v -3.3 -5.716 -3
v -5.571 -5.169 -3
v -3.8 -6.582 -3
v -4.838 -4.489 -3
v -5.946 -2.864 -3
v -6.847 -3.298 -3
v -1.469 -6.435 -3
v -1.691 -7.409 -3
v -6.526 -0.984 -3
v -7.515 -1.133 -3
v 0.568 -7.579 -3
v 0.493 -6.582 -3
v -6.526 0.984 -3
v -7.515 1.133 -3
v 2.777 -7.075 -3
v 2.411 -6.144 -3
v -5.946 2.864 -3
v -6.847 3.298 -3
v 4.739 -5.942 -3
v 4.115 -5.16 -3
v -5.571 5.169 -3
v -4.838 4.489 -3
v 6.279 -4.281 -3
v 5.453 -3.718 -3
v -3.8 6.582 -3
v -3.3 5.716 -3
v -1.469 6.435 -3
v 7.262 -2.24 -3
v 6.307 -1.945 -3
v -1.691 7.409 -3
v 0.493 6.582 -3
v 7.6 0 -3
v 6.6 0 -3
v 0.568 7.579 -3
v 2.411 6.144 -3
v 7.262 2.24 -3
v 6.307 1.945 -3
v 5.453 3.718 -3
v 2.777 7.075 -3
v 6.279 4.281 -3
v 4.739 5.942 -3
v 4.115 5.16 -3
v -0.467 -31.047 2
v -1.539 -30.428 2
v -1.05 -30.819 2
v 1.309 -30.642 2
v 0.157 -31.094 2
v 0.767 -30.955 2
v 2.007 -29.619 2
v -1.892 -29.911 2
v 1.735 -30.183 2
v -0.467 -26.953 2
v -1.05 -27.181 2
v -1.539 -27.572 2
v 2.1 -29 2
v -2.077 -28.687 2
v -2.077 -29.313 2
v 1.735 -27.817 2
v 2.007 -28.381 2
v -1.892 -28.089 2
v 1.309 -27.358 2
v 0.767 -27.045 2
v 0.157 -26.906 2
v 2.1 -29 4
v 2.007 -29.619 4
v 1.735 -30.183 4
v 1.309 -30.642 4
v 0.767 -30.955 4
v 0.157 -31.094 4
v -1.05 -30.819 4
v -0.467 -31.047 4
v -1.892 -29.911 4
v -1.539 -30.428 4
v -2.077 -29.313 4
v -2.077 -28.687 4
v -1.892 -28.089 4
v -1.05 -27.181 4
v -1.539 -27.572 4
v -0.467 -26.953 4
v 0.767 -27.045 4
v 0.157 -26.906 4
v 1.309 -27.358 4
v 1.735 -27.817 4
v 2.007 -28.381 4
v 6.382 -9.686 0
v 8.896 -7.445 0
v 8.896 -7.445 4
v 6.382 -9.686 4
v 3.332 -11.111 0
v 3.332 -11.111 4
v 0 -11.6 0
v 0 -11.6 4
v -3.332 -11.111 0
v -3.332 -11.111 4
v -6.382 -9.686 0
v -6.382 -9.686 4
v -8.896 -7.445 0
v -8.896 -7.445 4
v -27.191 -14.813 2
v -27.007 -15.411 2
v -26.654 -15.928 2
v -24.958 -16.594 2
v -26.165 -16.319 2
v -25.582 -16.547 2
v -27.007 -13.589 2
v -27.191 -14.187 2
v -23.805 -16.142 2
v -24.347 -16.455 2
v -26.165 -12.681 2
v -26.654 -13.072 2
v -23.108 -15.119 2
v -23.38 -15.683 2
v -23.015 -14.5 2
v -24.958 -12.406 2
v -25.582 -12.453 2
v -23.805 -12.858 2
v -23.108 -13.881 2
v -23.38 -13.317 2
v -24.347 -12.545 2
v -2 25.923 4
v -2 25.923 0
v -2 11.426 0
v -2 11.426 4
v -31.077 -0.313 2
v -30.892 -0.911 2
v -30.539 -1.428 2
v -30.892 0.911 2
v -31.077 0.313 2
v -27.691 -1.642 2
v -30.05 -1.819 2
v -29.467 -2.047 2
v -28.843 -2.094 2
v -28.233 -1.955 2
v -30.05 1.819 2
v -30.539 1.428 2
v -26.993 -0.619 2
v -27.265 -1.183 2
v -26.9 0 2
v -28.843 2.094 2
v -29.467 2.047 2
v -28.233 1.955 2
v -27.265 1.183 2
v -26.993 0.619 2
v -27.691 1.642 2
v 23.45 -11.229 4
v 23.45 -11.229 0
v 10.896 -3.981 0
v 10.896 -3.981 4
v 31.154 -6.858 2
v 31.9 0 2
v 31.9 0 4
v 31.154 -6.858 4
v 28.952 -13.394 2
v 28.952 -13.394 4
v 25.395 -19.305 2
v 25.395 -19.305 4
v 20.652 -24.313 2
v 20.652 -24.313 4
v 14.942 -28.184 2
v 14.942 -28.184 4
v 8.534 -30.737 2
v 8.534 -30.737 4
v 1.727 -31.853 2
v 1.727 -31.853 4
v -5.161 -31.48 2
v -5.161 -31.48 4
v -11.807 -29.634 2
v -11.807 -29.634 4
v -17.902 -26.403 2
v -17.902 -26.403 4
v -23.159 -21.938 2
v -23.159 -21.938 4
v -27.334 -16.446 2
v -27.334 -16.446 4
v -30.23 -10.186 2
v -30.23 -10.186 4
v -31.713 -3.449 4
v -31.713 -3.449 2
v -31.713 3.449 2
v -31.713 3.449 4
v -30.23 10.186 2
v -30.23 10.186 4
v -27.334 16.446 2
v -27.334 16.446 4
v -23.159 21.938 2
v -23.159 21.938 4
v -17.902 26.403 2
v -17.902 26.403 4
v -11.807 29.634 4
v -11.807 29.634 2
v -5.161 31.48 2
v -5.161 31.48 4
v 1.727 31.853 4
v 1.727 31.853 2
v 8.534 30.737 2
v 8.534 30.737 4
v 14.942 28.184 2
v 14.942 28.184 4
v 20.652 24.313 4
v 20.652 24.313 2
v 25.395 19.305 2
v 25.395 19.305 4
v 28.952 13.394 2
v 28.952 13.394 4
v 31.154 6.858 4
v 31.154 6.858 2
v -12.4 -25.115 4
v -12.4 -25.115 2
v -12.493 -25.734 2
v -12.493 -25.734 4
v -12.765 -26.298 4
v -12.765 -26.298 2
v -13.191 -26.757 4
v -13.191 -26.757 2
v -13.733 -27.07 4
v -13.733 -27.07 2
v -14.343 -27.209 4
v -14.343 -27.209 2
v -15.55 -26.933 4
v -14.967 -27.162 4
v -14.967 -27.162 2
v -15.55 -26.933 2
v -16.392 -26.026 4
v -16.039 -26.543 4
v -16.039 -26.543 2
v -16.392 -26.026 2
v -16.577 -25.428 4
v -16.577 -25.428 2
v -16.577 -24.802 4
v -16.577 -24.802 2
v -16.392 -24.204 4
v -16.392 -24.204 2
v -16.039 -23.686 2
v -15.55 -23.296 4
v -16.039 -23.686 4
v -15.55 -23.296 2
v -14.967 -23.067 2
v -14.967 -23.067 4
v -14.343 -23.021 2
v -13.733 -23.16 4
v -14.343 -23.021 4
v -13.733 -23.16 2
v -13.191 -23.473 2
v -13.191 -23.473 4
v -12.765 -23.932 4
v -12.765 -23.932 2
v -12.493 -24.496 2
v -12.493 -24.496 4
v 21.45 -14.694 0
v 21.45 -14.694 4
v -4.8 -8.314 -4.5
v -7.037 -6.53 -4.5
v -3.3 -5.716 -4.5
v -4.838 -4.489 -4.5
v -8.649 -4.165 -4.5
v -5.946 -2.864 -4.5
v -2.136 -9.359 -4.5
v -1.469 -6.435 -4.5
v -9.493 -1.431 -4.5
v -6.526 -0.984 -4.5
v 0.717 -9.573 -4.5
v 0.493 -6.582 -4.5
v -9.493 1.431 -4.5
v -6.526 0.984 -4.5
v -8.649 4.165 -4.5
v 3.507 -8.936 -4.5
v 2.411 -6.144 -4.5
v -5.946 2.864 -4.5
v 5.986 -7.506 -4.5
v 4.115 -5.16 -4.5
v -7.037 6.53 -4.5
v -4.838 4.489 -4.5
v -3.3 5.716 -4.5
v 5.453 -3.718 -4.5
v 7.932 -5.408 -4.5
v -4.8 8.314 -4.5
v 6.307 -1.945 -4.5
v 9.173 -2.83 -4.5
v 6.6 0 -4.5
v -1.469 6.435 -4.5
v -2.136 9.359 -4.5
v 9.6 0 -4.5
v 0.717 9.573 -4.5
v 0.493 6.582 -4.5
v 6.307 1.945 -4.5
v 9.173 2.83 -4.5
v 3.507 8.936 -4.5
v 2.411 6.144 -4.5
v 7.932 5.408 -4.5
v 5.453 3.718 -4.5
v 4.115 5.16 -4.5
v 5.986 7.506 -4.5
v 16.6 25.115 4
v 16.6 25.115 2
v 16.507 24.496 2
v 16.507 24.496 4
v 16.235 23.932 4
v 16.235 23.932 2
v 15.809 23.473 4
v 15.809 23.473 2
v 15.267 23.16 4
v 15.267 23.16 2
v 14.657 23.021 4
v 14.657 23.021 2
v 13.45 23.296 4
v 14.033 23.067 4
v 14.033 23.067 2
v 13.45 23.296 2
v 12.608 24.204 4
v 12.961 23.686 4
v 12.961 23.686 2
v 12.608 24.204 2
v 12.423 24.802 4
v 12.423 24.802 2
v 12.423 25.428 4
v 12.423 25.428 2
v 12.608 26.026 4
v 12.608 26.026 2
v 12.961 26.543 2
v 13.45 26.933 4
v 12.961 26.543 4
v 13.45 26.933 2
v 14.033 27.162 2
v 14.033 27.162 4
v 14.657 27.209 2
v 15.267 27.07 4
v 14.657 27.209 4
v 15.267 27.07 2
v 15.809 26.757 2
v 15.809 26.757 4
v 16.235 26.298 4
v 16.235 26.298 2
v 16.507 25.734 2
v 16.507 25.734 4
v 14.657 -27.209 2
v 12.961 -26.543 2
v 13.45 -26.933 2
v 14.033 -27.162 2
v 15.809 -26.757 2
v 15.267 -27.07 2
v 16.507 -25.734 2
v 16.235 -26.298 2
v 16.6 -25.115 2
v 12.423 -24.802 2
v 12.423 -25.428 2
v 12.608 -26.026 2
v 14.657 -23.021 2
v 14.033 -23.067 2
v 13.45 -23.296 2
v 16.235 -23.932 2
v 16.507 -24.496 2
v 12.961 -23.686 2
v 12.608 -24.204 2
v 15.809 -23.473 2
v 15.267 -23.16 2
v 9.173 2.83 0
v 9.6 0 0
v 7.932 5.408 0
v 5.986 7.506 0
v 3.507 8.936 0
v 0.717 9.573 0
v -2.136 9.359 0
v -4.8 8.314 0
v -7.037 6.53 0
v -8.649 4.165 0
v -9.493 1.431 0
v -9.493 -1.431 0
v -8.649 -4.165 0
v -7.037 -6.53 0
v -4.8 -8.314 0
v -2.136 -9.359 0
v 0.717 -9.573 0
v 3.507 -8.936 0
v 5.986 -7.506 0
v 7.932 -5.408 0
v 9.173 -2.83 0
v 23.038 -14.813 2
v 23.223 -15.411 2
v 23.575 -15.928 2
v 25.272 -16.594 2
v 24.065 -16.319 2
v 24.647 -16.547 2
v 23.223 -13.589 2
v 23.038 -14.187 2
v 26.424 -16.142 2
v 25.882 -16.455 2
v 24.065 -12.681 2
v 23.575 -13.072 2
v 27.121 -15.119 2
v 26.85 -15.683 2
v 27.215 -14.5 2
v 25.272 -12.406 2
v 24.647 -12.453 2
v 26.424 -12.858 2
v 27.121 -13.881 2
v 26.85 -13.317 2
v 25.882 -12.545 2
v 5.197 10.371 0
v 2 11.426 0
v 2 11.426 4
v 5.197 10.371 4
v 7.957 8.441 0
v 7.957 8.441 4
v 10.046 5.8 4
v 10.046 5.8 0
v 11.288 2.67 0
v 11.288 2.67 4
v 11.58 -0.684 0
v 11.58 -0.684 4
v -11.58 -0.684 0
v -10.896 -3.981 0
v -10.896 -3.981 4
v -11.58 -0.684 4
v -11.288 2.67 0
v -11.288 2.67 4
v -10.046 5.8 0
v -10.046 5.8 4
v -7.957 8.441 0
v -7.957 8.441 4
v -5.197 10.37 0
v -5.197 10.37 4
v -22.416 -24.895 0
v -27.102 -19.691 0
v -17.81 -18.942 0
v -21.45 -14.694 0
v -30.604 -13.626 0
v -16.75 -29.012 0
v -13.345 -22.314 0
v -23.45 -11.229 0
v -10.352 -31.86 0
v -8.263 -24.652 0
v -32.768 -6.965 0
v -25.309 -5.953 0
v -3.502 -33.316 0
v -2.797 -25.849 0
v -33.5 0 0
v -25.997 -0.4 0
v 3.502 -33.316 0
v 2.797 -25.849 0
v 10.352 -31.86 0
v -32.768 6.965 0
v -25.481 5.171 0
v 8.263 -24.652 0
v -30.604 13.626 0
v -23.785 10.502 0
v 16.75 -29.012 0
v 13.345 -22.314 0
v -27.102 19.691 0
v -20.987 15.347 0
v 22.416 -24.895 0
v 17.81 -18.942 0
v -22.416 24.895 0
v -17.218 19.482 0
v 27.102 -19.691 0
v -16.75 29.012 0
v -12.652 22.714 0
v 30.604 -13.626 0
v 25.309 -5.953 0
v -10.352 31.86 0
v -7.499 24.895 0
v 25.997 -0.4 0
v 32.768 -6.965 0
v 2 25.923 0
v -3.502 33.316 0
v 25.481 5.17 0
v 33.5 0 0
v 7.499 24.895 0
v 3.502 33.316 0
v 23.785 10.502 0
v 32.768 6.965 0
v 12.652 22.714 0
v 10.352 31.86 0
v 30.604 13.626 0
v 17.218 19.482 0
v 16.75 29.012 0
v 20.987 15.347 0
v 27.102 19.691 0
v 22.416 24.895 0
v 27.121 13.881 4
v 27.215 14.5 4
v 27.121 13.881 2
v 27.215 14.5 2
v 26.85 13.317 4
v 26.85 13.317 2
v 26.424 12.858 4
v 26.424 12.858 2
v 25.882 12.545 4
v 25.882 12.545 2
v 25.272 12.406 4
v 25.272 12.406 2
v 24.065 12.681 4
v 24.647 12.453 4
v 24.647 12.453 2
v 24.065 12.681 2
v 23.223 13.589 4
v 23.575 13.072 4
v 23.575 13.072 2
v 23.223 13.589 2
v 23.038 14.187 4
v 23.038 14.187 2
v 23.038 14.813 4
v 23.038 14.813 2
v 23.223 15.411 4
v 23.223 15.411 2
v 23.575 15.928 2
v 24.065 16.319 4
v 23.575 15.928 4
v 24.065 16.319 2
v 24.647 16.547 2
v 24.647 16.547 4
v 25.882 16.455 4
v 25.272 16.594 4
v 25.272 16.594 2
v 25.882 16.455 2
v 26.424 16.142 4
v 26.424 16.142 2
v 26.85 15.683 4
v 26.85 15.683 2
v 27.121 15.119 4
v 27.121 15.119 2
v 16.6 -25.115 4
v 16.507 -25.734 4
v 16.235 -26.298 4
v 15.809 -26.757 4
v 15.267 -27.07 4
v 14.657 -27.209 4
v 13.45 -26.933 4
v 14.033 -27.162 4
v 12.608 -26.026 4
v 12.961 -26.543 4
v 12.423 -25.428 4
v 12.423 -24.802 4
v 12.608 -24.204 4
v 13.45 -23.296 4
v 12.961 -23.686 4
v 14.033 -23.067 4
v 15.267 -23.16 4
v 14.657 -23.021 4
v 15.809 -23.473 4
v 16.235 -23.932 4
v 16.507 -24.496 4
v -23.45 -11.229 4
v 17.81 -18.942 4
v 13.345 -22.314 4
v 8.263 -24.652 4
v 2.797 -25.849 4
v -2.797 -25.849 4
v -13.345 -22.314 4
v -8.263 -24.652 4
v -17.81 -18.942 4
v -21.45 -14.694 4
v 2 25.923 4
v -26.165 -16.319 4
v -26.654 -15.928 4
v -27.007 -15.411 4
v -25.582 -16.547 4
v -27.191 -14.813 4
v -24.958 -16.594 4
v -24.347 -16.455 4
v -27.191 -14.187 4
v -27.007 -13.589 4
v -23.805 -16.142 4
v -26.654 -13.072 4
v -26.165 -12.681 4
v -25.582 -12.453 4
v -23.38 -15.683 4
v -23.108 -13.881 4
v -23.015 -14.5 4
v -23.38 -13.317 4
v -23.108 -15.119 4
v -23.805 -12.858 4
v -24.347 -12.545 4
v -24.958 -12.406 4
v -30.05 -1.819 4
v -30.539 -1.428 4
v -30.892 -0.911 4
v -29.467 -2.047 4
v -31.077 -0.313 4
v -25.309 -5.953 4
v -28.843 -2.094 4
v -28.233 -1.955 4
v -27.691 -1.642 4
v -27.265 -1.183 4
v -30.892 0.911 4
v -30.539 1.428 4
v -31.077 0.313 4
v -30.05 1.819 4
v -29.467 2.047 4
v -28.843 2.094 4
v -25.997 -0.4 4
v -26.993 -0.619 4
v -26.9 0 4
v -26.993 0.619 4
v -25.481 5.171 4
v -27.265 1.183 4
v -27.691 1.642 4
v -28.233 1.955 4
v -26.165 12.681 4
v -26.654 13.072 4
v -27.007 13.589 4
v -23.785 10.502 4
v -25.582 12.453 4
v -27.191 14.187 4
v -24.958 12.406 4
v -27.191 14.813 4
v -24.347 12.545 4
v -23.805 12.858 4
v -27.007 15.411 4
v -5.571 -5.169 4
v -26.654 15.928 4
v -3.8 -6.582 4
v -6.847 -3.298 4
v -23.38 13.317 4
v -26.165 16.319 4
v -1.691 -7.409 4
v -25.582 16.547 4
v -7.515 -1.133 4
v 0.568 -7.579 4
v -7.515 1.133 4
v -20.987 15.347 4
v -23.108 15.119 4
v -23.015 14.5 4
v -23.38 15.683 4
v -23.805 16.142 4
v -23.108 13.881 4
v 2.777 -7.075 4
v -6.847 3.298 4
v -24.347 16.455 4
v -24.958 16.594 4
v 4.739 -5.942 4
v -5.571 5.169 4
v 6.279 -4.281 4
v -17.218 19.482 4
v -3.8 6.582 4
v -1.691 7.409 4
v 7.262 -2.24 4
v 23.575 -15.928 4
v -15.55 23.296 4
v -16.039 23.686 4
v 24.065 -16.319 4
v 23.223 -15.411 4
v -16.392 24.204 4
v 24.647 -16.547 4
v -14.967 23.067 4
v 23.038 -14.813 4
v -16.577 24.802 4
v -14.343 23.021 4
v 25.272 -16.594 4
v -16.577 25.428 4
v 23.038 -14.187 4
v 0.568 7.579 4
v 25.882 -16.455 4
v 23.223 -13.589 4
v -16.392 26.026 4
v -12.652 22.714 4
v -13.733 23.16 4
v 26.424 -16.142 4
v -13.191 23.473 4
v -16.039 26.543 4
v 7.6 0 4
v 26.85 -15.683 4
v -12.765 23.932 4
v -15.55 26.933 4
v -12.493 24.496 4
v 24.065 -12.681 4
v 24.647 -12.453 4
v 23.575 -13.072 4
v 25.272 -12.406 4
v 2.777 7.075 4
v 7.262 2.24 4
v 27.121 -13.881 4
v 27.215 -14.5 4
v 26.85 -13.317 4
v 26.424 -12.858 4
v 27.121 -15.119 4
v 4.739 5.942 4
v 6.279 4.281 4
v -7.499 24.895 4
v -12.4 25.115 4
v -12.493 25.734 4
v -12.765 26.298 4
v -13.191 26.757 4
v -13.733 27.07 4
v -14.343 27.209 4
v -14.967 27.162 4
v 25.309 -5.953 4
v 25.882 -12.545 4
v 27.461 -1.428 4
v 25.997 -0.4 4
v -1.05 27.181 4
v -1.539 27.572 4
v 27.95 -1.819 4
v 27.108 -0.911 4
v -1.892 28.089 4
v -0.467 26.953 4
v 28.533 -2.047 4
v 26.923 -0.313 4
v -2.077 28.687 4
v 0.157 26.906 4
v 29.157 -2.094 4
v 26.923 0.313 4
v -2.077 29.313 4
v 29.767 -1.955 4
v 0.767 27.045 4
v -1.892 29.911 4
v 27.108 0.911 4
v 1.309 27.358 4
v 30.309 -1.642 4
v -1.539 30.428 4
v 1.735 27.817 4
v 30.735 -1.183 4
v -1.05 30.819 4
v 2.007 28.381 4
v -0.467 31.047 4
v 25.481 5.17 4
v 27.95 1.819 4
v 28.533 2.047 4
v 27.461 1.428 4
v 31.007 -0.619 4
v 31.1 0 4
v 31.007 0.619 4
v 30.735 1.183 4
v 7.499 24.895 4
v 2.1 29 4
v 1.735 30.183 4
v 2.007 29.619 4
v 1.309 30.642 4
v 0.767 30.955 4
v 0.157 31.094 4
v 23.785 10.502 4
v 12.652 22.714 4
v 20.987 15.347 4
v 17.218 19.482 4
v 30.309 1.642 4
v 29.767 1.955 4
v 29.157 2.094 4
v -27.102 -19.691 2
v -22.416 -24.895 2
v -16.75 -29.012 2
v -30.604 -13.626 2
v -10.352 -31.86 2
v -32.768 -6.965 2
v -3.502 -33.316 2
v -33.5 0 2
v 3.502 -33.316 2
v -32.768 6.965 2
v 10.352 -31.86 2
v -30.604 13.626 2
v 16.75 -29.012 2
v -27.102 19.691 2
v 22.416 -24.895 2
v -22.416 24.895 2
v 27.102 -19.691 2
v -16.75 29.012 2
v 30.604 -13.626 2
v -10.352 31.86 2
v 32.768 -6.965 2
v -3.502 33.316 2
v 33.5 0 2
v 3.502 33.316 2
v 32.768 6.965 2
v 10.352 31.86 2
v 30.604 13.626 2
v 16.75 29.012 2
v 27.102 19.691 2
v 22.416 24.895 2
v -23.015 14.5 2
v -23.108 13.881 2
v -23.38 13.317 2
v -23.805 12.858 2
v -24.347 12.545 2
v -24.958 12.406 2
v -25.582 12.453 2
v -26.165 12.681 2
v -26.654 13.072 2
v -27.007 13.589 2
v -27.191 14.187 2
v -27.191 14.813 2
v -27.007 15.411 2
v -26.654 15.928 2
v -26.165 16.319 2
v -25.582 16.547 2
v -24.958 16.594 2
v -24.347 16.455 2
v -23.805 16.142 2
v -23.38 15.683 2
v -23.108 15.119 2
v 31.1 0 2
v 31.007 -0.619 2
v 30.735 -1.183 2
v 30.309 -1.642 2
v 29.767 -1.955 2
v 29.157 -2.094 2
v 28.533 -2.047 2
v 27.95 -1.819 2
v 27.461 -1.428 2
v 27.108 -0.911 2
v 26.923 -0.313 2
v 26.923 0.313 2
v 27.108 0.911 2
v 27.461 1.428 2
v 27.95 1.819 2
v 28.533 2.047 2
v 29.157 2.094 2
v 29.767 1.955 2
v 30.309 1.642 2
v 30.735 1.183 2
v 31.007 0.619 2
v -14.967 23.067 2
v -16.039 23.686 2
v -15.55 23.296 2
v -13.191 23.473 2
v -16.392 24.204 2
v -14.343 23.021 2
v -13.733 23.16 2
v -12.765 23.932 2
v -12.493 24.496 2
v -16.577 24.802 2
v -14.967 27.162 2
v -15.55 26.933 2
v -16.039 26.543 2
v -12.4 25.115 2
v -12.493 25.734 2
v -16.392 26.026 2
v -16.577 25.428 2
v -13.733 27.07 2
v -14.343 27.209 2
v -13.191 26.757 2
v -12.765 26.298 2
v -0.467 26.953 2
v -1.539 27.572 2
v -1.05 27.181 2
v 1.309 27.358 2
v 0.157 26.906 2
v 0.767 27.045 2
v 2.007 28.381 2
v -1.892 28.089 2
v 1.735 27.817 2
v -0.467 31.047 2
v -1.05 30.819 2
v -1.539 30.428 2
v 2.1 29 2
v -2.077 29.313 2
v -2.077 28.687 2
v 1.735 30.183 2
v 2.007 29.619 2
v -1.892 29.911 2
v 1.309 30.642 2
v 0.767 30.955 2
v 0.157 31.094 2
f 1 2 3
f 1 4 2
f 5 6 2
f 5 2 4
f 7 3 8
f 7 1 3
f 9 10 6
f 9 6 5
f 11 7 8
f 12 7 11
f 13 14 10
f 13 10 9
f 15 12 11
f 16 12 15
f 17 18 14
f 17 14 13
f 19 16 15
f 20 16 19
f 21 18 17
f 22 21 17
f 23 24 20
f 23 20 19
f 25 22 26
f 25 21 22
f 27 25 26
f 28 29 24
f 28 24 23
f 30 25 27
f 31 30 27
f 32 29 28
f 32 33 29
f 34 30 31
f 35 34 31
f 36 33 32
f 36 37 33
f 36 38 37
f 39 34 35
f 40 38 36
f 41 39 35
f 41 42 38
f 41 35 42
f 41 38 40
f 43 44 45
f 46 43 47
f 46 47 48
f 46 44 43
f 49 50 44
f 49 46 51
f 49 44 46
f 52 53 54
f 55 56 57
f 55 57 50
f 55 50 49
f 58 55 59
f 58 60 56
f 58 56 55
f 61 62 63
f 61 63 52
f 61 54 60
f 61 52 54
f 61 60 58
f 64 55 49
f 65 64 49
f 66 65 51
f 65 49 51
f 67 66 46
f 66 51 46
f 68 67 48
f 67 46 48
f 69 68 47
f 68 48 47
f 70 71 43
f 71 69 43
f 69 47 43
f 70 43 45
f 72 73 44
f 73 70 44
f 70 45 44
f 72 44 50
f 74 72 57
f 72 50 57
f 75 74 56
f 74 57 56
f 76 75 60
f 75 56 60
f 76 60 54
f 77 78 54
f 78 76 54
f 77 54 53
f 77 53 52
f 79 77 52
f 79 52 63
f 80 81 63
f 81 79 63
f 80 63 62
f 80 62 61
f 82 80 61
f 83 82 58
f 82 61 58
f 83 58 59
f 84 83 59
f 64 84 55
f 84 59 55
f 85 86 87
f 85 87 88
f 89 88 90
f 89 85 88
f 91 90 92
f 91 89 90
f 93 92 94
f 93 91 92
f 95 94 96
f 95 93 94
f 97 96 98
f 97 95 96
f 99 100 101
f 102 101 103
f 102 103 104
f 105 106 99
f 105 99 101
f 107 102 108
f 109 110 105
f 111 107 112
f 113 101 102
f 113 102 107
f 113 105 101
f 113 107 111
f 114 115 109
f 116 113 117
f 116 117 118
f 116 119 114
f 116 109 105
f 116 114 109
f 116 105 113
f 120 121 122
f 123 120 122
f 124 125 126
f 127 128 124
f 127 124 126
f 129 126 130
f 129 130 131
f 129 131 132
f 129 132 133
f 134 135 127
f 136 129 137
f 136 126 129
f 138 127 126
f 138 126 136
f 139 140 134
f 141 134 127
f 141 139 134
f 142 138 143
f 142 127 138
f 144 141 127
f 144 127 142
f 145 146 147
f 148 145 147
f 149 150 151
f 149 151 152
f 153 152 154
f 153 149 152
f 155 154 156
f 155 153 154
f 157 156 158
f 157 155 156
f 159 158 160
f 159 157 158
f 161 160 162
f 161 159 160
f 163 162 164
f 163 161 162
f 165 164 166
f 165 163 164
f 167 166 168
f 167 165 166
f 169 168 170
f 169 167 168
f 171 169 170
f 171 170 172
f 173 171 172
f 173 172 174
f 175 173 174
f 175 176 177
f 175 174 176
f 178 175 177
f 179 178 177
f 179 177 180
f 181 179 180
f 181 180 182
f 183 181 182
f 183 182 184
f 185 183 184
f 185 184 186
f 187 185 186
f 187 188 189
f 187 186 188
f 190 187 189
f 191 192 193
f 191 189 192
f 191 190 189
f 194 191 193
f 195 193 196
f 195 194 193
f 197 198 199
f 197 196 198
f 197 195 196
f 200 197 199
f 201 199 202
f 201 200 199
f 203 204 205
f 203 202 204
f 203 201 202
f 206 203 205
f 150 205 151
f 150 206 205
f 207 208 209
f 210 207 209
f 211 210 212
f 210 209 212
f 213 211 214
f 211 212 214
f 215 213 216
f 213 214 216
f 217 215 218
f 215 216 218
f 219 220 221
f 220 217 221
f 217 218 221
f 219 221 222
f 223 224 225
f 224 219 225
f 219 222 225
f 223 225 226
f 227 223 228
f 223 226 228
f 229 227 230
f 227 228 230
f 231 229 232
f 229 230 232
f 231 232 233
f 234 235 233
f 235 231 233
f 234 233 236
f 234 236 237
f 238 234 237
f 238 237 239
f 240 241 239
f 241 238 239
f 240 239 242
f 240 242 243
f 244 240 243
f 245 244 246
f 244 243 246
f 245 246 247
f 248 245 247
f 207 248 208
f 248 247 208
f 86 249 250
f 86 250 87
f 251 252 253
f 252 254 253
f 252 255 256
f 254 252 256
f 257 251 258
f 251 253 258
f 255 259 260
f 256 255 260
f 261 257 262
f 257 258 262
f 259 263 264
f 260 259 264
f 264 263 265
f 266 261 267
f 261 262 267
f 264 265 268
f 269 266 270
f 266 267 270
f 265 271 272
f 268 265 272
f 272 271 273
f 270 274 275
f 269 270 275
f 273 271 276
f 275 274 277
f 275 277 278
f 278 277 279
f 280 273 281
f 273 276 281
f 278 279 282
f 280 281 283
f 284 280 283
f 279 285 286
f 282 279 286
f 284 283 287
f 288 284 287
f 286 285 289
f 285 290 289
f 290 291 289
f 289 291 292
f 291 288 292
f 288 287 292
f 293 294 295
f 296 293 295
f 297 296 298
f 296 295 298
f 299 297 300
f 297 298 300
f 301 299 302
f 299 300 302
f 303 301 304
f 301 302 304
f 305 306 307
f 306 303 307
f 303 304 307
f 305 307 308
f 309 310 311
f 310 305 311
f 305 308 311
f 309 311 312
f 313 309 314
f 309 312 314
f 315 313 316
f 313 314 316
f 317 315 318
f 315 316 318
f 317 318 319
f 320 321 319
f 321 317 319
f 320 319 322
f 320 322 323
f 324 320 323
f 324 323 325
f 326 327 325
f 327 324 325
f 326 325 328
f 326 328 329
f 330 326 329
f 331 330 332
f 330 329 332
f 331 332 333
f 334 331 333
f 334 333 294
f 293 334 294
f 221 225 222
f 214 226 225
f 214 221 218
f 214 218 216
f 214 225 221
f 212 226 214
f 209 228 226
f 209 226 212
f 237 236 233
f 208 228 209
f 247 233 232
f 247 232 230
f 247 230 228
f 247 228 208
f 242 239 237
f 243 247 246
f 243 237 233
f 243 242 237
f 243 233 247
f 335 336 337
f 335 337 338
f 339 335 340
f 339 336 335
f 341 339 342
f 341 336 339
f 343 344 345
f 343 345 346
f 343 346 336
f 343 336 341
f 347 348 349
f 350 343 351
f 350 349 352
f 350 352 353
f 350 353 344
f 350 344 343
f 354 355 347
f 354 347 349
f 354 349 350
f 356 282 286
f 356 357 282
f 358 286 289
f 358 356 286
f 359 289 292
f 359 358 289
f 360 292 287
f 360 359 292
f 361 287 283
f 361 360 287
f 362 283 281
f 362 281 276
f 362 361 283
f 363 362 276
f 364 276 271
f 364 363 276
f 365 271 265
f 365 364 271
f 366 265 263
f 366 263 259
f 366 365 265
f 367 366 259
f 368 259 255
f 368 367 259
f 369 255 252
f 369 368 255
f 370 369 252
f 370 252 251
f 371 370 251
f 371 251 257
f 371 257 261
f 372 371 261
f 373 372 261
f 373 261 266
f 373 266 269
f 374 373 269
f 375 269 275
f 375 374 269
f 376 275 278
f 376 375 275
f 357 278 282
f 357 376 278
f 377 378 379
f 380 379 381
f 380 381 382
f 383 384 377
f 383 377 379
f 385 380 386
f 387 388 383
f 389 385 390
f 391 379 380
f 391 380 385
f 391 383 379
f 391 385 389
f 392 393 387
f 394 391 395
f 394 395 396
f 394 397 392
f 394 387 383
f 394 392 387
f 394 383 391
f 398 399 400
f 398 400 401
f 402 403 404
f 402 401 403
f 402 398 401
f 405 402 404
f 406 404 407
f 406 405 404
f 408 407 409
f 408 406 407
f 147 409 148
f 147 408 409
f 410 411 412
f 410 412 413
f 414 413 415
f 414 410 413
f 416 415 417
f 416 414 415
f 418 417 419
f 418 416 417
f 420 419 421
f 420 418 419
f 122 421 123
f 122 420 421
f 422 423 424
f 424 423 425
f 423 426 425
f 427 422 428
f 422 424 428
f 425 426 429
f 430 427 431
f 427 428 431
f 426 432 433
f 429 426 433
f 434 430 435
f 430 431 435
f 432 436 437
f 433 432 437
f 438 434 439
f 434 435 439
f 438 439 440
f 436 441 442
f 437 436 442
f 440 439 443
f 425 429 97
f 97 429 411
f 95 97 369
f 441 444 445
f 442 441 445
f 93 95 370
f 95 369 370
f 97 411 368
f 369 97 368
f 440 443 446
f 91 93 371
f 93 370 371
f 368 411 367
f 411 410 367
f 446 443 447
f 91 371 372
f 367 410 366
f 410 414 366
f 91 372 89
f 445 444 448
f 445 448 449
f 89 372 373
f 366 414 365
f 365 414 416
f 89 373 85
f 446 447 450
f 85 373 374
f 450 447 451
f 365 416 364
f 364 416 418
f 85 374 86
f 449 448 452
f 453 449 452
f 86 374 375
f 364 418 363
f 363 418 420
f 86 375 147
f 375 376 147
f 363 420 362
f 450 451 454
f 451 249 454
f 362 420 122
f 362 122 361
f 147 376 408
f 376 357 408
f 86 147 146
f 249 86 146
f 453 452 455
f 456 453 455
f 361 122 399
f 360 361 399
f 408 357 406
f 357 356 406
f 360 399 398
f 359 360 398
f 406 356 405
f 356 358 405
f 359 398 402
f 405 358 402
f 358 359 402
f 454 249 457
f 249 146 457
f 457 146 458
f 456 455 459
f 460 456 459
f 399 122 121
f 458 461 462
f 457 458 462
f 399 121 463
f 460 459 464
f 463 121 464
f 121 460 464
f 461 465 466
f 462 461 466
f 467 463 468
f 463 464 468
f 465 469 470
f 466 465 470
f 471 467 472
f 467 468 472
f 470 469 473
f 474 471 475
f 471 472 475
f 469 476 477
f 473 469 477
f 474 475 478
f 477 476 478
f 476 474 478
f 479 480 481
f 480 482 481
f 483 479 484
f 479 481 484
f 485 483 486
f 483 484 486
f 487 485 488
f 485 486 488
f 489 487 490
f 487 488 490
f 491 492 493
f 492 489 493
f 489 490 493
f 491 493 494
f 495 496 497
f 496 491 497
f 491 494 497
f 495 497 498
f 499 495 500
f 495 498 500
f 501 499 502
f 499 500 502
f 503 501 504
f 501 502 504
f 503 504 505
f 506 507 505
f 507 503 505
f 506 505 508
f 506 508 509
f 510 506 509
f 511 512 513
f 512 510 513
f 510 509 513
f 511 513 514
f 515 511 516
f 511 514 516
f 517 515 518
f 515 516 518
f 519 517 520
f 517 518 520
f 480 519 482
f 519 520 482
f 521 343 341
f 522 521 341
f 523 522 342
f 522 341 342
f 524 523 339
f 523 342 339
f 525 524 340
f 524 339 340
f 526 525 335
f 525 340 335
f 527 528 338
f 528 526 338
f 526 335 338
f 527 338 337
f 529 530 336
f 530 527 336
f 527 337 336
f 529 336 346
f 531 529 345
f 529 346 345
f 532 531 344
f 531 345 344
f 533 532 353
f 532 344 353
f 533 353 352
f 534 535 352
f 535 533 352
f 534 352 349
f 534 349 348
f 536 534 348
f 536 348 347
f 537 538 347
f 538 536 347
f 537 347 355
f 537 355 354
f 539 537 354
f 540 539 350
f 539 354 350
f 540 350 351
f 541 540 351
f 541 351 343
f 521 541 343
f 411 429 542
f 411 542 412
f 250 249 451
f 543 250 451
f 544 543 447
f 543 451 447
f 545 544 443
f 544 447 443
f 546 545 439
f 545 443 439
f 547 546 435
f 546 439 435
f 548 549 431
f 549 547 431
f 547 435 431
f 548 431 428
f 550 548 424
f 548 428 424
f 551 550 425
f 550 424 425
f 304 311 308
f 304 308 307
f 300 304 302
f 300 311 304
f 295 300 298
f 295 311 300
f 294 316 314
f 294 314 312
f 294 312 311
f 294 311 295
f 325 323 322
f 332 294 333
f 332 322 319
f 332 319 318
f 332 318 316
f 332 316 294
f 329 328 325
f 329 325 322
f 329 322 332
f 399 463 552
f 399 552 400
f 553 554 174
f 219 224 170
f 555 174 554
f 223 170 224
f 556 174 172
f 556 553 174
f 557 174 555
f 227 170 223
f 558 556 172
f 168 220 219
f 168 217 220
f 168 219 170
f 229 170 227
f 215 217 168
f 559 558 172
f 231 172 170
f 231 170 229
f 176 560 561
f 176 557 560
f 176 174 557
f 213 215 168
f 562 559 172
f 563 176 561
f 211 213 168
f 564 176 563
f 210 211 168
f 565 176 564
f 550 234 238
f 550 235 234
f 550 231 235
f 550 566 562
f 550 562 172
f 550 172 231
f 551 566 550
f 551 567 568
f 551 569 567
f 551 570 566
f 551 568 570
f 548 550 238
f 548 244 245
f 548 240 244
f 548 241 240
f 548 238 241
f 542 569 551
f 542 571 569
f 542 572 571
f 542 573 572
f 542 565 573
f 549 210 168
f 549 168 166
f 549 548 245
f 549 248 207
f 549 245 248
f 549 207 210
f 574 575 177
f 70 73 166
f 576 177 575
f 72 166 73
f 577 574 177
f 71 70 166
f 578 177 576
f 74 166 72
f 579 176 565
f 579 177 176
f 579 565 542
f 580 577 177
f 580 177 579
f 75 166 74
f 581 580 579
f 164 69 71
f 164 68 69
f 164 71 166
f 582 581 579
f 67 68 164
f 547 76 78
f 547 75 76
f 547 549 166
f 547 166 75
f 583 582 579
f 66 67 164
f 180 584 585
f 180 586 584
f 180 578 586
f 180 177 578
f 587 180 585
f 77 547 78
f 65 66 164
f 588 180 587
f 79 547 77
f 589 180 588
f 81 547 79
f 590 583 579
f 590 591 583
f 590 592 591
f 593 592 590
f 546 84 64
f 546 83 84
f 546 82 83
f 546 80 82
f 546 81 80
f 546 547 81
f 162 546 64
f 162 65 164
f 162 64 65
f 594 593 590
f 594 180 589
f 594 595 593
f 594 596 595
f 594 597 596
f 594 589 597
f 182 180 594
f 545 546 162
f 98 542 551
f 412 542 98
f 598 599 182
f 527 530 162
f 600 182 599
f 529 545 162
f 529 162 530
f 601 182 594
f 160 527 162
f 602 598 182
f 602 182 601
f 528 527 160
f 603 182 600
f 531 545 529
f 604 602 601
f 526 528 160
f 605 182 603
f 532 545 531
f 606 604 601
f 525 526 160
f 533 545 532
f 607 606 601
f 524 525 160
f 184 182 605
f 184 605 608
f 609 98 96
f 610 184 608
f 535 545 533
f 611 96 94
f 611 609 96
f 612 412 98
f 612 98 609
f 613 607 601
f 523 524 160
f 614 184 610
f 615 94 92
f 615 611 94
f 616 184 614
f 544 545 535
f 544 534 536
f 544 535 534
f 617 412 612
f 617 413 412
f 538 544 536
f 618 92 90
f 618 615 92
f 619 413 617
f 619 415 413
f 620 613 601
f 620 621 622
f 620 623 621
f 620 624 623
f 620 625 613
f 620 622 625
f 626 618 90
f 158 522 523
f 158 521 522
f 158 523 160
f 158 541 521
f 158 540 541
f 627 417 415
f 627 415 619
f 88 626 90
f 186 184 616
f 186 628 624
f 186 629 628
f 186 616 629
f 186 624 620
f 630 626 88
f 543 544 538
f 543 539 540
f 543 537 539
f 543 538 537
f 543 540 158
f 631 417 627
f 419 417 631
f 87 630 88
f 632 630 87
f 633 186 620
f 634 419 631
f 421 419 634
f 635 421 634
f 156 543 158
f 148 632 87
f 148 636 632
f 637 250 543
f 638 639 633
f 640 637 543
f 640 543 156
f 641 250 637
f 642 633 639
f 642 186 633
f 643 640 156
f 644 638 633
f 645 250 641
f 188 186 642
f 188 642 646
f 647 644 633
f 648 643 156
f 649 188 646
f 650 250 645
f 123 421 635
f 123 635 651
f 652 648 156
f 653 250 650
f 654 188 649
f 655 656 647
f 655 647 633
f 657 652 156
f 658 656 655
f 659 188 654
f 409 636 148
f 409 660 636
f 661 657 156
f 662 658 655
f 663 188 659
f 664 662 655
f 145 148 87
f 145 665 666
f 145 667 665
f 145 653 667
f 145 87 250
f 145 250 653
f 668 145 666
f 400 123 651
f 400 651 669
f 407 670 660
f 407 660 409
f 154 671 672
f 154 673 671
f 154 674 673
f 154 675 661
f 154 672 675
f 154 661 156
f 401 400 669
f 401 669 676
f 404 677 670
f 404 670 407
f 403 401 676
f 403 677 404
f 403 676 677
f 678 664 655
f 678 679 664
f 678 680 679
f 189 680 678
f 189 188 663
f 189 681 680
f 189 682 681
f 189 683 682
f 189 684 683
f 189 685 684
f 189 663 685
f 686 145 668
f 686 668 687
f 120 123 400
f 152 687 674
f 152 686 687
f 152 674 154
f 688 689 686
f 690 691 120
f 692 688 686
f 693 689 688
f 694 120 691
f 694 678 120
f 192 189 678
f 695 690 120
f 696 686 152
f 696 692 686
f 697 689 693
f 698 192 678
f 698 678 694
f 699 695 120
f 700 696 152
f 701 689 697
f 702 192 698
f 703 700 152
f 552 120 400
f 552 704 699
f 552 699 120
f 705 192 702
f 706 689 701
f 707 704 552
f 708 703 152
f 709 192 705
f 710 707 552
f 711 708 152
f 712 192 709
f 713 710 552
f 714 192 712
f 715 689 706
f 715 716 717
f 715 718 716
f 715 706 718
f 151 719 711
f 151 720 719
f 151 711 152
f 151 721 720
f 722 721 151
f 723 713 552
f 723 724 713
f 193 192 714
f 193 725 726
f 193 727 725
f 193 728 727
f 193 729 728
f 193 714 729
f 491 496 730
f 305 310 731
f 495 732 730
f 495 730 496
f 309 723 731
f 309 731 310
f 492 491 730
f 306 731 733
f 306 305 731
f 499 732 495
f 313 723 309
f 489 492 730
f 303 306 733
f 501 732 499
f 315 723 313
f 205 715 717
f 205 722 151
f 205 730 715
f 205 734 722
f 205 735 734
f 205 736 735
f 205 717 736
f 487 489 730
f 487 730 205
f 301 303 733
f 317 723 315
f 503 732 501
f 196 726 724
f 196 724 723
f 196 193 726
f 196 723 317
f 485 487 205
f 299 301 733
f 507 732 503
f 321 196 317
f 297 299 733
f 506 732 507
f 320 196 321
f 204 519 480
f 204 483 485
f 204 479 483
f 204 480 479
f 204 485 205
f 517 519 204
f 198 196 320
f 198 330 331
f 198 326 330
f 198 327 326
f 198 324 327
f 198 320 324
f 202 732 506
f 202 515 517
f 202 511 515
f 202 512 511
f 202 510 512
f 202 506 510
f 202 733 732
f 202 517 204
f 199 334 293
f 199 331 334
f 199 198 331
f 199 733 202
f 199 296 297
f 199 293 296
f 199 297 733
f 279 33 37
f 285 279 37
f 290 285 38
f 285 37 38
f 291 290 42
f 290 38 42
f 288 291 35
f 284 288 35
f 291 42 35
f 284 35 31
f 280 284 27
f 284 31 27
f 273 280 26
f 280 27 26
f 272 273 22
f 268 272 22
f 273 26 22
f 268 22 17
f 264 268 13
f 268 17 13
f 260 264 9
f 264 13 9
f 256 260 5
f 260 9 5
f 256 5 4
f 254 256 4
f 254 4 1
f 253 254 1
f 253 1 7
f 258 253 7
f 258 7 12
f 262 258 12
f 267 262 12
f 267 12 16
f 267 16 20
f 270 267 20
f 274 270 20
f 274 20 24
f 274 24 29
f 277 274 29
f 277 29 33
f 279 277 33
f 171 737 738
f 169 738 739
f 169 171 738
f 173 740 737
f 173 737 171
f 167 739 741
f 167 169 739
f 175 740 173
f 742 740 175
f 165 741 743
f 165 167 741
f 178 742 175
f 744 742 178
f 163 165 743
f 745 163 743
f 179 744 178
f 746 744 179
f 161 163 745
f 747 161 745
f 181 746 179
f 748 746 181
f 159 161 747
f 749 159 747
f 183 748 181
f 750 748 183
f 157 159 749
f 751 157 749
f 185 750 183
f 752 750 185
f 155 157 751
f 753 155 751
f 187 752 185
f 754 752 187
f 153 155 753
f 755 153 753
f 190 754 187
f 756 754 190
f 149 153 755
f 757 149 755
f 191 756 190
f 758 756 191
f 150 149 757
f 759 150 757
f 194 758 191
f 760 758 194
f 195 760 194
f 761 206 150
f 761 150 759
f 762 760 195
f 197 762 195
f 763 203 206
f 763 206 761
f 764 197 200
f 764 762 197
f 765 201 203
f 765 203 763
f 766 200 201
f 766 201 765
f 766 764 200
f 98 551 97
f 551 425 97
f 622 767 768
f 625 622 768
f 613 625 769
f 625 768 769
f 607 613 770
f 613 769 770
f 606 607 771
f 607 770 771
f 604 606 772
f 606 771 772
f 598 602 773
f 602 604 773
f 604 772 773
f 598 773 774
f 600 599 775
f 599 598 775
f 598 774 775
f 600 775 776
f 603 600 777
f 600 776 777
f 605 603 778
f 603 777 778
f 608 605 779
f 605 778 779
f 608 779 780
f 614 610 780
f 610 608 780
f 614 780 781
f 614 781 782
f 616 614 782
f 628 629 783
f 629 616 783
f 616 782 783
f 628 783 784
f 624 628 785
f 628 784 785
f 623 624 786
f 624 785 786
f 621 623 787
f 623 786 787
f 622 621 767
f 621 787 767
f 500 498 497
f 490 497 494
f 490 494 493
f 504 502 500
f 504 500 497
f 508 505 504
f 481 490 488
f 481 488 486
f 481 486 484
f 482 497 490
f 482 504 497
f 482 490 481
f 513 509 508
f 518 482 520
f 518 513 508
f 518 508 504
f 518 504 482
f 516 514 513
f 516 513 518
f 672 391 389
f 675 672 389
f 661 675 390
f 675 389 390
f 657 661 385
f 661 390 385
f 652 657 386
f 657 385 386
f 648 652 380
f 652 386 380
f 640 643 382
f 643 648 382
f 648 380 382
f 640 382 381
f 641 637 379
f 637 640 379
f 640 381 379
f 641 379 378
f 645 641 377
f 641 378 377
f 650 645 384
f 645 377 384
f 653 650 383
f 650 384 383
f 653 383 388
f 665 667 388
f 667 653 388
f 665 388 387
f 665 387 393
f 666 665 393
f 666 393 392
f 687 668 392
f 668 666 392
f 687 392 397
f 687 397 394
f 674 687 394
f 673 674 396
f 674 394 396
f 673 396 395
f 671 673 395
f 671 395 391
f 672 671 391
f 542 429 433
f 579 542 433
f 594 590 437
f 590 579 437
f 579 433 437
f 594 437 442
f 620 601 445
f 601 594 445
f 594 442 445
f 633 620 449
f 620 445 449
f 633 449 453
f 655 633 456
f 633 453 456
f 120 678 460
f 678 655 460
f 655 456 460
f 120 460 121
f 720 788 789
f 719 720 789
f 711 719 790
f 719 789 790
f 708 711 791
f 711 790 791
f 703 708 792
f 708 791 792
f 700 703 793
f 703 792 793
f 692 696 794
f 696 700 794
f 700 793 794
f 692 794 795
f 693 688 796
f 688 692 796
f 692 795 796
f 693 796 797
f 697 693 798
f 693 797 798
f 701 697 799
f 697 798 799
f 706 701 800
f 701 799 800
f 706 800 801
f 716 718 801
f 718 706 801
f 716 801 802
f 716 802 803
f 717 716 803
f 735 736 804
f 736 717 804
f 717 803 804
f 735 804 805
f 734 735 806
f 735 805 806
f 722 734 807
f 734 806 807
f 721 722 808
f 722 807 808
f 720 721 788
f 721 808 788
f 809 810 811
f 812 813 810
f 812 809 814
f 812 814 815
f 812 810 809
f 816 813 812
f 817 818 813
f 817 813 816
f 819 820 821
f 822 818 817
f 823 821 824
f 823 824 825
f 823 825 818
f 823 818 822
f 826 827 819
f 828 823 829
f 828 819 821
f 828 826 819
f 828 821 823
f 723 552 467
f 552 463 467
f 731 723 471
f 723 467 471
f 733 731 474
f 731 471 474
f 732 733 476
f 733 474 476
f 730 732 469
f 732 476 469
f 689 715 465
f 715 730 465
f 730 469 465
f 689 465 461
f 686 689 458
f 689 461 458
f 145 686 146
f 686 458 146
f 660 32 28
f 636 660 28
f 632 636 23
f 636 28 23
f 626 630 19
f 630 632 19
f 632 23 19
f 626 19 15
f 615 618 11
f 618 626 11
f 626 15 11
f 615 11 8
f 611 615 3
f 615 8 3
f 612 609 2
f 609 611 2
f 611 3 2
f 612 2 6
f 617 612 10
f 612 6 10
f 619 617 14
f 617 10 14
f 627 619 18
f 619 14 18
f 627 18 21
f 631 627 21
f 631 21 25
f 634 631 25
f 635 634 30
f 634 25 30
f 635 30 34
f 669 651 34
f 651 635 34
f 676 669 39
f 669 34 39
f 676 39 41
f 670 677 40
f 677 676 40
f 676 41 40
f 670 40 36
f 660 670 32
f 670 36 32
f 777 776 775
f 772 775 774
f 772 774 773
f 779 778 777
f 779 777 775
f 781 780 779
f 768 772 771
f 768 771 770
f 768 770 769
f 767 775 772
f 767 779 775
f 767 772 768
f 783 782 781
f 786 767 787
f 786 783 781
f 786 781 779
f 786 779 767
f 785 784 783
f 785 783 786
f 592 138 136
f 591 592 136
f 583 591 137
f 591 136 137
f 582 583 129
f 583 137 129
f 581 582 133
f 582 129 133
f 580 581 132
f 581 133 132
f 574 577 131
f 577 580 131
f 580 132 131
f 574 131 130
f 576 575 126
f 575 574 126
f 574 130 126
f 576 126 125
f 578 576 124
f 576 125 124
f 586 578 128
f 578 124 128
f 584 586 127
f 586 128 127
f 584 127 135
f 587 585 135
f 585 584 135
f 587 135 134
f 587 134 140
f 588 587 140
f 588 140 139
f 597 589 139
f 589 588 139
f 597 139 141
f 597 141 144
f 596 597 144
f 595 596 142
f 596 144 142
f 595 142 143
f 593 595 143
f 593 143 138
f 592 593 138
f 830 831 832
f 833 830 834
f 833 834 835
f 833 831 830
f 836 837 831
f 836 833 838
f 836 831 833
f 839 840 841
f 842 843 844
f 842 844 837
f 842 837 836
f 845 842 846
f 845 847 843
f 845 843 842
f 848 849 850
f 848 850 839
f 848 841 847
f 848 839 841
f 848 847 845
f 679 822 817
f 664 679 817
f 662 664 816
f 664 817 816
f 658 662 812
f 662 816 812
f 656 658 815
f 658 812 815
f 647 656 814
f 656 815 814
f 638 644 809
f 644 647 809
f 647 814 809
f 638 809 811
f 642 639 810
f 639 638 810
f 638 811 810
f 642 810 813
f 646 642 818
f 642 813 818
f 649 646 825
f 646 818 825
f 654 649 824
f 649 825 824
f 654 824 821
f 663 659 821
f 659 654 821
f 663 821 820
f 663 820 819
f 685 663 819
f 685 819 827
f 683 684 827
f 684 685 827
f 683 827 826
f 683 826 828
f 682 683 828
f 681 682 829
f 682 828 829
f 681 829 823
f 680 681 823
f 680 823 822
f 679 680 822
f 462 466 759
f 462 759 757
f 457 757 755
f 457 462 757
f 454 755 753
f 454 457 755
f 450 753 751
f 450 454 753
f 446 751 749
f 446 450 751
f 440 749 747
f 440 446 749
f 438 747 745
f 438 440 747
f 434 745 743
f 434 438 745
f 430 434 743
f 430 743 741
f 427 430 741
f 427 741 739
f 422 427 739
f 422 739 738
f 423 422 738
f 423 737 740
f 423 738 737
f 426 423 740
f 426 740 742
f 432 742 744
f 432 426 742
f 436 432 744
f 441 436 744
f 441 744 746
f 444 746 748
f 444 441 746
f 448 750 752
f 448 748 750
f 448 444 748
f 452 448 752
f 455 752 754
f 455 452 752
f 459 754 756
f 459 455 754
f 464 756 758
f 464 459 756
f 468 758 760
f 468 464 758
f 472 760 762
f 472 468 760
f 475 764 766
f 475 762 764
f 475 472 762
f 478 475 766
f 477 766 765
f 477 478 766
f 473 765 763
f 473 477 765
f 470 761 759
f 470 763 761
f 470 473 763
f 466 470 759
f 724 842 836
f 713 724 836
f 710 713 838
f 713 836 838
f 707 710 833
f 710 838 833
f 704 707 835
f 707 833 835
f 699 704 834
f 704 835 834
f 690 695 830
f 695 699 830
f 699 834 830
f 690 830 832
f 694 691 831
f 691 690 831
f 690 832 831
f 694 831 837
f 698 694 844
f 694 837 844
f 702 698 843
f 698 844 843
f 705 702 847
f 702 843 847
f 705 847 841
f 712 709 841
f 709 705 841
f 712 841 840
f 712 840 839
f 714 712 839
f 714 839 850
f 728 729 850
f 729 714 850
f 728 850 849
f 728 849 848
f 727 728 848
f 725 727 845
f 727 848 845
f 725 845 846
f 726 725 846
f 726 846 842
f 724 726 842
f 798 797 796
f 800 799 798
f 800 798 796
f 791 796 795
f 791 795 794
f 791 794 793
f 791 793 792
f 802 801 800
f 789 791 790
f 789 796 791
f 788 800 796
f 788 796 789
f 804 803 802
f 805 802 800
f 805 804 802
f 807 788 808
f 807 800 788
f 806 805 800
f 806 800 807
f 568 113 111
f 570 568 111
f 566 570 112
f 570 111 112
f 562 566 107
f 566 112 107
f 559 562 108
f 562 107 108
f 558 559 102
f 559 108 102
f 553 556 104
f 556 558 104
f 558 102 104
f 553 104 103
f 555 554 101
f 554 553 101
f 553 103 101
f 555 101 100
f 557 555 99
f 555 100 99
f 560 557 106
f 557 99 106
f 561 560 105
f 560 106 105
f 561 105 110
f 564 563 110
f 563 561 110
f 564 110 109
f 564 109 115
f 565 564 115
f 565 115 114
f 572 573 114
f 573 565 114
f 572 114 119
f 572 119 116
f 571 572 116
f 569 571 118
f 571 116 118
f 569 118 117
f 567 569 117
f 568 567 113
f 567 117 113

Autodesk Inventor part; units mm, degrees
ref_plane "YZ Plane" through (0, 0, 0) normal (1, 0, 0) x (0, 1, 0)
ref_plane "XZ Plane" through (0, 0, 0) normal (0, 1, 0) x (-1, 0, 0)
ref_plane "XY Plane" through (0, 0, 0) normal (0, 0, 1) x (1, 0, 0)
sketch "Skizze1" plane through (0, 0, 0) normal (0, 0, 1) x (1, 0, 0)
  circle A0 centre (0, 0) radius 29 construction
  circle A1 centre (0, 0) radius 33.5
  circle A2 centre (0, 0) radius 7.6
  circle A3 centre (0, 0) radius 9.6
  circle A4 centre (0, 0) radius 6.6
  line L0 (0, 46.9) -> (0, -46.9) construction
  line L1 (-46.9, 0) -> (46.9, 0) construction
  line L2 (-2, 25.923) -> (-2, 11.4263)
  line L3 (0, 0) -> (-28.9685, 16.725) construction
  line L4 (-23.4499, -11.2294) -> (-10.8955, -3.9811)
  arc A5 (-2, 11.4263) -> (-10.8955, -3.9811) centre (0, 0) ccw
  arc A6 (-2, 25.923) -> (-23.4499, -11.2294) centre (0, 0) ccw
  line L5 (21.4499, -14.6935) -> (8.8955, -7.4452)
  arc A7 (-21.4499, -14.6935) -> (21.4499, -14.6935) centre (0, 0) ccw
  line L6 (-21.4499, -14.6935) -> (-8.8955, -7.4452)
  arc A8 (-8.8955, -7.4452) -> (8.8955, -7.4452) centre (0, 0) ccw
  line L7 (2, 25.923) -> (2, 11.4263)
  arc A9 (23.4499, -11.2294) -> (2, 25.923) centre (0, 0) ccw
  line L8 (23.4499, -11.2294) -> (10.8955, -3.9811)
  arc A10 (10.8955, -3.9811) -> (2, 11.4263) centre (0, 0) ccw
  circle A11 centre (0, 29) radius 2.1
  circle A12 centre (-14.5, 25.1147) radius 2.1
  circle A13 centre (-25.1147, 14.5) radius 2.1
  circle A14 centre (-29, 0) radius 2.1
  circle A15 centre (-25.1147, -14.5) radius 2.1
  circle A16 centre (-14.5, -25.1147) radius 2.1
  circle A17 centre (0, -29) radius 2.1
  circle A18 centre (14.5, -25.1147) radius 2.1
  circle A19 centre (25.1147, -14.5) radius 2.1
  circle A20 centre (29, 0) radius 2.1
  circle A21 centre (25.1147, 14.5) radius 2.1
  circle A22 centre (0, 0) radius 31.9
  circle A23 centre (14.5, 25.1147) radius 2.1
  dimension "d1" = 29
  dimension "d2" = 15.2
  dimension "d3" = 2
  dimension "d12" = 1
  dimension "d17" = 60
  dimension "d18" = 2
  dimension "d19" = 3
  dimension "d20" = 2
  dimension "d23" = 360
  dimension "d28" = 4.2
  dimension "d31" = 360
  dimension "d33" = 63.8
  dimension "d35" = 67
extrude "Extrusion1" add sketch "Skizze1" along normal blind 2 contours A1 | A3 | A11 | A12 | A13 | A14 | A15 | A16 | A17 | A18 | A19 | A20 | A21 | A22 | A23
extrude "Extrusion2" add sketch "Skizze1" along normal blind 2 from surface at 2 contours A3 | A22
extrude "Extrusion3" add sketch "Skizze1" against normal blind 3 from surface at 0 contours A3
extrude "Extrusion4" add sketch "Skizze1" against normal blind 1.5 from surface at -3 contours A2 | A3
properties part number "ShaftHolder2"
